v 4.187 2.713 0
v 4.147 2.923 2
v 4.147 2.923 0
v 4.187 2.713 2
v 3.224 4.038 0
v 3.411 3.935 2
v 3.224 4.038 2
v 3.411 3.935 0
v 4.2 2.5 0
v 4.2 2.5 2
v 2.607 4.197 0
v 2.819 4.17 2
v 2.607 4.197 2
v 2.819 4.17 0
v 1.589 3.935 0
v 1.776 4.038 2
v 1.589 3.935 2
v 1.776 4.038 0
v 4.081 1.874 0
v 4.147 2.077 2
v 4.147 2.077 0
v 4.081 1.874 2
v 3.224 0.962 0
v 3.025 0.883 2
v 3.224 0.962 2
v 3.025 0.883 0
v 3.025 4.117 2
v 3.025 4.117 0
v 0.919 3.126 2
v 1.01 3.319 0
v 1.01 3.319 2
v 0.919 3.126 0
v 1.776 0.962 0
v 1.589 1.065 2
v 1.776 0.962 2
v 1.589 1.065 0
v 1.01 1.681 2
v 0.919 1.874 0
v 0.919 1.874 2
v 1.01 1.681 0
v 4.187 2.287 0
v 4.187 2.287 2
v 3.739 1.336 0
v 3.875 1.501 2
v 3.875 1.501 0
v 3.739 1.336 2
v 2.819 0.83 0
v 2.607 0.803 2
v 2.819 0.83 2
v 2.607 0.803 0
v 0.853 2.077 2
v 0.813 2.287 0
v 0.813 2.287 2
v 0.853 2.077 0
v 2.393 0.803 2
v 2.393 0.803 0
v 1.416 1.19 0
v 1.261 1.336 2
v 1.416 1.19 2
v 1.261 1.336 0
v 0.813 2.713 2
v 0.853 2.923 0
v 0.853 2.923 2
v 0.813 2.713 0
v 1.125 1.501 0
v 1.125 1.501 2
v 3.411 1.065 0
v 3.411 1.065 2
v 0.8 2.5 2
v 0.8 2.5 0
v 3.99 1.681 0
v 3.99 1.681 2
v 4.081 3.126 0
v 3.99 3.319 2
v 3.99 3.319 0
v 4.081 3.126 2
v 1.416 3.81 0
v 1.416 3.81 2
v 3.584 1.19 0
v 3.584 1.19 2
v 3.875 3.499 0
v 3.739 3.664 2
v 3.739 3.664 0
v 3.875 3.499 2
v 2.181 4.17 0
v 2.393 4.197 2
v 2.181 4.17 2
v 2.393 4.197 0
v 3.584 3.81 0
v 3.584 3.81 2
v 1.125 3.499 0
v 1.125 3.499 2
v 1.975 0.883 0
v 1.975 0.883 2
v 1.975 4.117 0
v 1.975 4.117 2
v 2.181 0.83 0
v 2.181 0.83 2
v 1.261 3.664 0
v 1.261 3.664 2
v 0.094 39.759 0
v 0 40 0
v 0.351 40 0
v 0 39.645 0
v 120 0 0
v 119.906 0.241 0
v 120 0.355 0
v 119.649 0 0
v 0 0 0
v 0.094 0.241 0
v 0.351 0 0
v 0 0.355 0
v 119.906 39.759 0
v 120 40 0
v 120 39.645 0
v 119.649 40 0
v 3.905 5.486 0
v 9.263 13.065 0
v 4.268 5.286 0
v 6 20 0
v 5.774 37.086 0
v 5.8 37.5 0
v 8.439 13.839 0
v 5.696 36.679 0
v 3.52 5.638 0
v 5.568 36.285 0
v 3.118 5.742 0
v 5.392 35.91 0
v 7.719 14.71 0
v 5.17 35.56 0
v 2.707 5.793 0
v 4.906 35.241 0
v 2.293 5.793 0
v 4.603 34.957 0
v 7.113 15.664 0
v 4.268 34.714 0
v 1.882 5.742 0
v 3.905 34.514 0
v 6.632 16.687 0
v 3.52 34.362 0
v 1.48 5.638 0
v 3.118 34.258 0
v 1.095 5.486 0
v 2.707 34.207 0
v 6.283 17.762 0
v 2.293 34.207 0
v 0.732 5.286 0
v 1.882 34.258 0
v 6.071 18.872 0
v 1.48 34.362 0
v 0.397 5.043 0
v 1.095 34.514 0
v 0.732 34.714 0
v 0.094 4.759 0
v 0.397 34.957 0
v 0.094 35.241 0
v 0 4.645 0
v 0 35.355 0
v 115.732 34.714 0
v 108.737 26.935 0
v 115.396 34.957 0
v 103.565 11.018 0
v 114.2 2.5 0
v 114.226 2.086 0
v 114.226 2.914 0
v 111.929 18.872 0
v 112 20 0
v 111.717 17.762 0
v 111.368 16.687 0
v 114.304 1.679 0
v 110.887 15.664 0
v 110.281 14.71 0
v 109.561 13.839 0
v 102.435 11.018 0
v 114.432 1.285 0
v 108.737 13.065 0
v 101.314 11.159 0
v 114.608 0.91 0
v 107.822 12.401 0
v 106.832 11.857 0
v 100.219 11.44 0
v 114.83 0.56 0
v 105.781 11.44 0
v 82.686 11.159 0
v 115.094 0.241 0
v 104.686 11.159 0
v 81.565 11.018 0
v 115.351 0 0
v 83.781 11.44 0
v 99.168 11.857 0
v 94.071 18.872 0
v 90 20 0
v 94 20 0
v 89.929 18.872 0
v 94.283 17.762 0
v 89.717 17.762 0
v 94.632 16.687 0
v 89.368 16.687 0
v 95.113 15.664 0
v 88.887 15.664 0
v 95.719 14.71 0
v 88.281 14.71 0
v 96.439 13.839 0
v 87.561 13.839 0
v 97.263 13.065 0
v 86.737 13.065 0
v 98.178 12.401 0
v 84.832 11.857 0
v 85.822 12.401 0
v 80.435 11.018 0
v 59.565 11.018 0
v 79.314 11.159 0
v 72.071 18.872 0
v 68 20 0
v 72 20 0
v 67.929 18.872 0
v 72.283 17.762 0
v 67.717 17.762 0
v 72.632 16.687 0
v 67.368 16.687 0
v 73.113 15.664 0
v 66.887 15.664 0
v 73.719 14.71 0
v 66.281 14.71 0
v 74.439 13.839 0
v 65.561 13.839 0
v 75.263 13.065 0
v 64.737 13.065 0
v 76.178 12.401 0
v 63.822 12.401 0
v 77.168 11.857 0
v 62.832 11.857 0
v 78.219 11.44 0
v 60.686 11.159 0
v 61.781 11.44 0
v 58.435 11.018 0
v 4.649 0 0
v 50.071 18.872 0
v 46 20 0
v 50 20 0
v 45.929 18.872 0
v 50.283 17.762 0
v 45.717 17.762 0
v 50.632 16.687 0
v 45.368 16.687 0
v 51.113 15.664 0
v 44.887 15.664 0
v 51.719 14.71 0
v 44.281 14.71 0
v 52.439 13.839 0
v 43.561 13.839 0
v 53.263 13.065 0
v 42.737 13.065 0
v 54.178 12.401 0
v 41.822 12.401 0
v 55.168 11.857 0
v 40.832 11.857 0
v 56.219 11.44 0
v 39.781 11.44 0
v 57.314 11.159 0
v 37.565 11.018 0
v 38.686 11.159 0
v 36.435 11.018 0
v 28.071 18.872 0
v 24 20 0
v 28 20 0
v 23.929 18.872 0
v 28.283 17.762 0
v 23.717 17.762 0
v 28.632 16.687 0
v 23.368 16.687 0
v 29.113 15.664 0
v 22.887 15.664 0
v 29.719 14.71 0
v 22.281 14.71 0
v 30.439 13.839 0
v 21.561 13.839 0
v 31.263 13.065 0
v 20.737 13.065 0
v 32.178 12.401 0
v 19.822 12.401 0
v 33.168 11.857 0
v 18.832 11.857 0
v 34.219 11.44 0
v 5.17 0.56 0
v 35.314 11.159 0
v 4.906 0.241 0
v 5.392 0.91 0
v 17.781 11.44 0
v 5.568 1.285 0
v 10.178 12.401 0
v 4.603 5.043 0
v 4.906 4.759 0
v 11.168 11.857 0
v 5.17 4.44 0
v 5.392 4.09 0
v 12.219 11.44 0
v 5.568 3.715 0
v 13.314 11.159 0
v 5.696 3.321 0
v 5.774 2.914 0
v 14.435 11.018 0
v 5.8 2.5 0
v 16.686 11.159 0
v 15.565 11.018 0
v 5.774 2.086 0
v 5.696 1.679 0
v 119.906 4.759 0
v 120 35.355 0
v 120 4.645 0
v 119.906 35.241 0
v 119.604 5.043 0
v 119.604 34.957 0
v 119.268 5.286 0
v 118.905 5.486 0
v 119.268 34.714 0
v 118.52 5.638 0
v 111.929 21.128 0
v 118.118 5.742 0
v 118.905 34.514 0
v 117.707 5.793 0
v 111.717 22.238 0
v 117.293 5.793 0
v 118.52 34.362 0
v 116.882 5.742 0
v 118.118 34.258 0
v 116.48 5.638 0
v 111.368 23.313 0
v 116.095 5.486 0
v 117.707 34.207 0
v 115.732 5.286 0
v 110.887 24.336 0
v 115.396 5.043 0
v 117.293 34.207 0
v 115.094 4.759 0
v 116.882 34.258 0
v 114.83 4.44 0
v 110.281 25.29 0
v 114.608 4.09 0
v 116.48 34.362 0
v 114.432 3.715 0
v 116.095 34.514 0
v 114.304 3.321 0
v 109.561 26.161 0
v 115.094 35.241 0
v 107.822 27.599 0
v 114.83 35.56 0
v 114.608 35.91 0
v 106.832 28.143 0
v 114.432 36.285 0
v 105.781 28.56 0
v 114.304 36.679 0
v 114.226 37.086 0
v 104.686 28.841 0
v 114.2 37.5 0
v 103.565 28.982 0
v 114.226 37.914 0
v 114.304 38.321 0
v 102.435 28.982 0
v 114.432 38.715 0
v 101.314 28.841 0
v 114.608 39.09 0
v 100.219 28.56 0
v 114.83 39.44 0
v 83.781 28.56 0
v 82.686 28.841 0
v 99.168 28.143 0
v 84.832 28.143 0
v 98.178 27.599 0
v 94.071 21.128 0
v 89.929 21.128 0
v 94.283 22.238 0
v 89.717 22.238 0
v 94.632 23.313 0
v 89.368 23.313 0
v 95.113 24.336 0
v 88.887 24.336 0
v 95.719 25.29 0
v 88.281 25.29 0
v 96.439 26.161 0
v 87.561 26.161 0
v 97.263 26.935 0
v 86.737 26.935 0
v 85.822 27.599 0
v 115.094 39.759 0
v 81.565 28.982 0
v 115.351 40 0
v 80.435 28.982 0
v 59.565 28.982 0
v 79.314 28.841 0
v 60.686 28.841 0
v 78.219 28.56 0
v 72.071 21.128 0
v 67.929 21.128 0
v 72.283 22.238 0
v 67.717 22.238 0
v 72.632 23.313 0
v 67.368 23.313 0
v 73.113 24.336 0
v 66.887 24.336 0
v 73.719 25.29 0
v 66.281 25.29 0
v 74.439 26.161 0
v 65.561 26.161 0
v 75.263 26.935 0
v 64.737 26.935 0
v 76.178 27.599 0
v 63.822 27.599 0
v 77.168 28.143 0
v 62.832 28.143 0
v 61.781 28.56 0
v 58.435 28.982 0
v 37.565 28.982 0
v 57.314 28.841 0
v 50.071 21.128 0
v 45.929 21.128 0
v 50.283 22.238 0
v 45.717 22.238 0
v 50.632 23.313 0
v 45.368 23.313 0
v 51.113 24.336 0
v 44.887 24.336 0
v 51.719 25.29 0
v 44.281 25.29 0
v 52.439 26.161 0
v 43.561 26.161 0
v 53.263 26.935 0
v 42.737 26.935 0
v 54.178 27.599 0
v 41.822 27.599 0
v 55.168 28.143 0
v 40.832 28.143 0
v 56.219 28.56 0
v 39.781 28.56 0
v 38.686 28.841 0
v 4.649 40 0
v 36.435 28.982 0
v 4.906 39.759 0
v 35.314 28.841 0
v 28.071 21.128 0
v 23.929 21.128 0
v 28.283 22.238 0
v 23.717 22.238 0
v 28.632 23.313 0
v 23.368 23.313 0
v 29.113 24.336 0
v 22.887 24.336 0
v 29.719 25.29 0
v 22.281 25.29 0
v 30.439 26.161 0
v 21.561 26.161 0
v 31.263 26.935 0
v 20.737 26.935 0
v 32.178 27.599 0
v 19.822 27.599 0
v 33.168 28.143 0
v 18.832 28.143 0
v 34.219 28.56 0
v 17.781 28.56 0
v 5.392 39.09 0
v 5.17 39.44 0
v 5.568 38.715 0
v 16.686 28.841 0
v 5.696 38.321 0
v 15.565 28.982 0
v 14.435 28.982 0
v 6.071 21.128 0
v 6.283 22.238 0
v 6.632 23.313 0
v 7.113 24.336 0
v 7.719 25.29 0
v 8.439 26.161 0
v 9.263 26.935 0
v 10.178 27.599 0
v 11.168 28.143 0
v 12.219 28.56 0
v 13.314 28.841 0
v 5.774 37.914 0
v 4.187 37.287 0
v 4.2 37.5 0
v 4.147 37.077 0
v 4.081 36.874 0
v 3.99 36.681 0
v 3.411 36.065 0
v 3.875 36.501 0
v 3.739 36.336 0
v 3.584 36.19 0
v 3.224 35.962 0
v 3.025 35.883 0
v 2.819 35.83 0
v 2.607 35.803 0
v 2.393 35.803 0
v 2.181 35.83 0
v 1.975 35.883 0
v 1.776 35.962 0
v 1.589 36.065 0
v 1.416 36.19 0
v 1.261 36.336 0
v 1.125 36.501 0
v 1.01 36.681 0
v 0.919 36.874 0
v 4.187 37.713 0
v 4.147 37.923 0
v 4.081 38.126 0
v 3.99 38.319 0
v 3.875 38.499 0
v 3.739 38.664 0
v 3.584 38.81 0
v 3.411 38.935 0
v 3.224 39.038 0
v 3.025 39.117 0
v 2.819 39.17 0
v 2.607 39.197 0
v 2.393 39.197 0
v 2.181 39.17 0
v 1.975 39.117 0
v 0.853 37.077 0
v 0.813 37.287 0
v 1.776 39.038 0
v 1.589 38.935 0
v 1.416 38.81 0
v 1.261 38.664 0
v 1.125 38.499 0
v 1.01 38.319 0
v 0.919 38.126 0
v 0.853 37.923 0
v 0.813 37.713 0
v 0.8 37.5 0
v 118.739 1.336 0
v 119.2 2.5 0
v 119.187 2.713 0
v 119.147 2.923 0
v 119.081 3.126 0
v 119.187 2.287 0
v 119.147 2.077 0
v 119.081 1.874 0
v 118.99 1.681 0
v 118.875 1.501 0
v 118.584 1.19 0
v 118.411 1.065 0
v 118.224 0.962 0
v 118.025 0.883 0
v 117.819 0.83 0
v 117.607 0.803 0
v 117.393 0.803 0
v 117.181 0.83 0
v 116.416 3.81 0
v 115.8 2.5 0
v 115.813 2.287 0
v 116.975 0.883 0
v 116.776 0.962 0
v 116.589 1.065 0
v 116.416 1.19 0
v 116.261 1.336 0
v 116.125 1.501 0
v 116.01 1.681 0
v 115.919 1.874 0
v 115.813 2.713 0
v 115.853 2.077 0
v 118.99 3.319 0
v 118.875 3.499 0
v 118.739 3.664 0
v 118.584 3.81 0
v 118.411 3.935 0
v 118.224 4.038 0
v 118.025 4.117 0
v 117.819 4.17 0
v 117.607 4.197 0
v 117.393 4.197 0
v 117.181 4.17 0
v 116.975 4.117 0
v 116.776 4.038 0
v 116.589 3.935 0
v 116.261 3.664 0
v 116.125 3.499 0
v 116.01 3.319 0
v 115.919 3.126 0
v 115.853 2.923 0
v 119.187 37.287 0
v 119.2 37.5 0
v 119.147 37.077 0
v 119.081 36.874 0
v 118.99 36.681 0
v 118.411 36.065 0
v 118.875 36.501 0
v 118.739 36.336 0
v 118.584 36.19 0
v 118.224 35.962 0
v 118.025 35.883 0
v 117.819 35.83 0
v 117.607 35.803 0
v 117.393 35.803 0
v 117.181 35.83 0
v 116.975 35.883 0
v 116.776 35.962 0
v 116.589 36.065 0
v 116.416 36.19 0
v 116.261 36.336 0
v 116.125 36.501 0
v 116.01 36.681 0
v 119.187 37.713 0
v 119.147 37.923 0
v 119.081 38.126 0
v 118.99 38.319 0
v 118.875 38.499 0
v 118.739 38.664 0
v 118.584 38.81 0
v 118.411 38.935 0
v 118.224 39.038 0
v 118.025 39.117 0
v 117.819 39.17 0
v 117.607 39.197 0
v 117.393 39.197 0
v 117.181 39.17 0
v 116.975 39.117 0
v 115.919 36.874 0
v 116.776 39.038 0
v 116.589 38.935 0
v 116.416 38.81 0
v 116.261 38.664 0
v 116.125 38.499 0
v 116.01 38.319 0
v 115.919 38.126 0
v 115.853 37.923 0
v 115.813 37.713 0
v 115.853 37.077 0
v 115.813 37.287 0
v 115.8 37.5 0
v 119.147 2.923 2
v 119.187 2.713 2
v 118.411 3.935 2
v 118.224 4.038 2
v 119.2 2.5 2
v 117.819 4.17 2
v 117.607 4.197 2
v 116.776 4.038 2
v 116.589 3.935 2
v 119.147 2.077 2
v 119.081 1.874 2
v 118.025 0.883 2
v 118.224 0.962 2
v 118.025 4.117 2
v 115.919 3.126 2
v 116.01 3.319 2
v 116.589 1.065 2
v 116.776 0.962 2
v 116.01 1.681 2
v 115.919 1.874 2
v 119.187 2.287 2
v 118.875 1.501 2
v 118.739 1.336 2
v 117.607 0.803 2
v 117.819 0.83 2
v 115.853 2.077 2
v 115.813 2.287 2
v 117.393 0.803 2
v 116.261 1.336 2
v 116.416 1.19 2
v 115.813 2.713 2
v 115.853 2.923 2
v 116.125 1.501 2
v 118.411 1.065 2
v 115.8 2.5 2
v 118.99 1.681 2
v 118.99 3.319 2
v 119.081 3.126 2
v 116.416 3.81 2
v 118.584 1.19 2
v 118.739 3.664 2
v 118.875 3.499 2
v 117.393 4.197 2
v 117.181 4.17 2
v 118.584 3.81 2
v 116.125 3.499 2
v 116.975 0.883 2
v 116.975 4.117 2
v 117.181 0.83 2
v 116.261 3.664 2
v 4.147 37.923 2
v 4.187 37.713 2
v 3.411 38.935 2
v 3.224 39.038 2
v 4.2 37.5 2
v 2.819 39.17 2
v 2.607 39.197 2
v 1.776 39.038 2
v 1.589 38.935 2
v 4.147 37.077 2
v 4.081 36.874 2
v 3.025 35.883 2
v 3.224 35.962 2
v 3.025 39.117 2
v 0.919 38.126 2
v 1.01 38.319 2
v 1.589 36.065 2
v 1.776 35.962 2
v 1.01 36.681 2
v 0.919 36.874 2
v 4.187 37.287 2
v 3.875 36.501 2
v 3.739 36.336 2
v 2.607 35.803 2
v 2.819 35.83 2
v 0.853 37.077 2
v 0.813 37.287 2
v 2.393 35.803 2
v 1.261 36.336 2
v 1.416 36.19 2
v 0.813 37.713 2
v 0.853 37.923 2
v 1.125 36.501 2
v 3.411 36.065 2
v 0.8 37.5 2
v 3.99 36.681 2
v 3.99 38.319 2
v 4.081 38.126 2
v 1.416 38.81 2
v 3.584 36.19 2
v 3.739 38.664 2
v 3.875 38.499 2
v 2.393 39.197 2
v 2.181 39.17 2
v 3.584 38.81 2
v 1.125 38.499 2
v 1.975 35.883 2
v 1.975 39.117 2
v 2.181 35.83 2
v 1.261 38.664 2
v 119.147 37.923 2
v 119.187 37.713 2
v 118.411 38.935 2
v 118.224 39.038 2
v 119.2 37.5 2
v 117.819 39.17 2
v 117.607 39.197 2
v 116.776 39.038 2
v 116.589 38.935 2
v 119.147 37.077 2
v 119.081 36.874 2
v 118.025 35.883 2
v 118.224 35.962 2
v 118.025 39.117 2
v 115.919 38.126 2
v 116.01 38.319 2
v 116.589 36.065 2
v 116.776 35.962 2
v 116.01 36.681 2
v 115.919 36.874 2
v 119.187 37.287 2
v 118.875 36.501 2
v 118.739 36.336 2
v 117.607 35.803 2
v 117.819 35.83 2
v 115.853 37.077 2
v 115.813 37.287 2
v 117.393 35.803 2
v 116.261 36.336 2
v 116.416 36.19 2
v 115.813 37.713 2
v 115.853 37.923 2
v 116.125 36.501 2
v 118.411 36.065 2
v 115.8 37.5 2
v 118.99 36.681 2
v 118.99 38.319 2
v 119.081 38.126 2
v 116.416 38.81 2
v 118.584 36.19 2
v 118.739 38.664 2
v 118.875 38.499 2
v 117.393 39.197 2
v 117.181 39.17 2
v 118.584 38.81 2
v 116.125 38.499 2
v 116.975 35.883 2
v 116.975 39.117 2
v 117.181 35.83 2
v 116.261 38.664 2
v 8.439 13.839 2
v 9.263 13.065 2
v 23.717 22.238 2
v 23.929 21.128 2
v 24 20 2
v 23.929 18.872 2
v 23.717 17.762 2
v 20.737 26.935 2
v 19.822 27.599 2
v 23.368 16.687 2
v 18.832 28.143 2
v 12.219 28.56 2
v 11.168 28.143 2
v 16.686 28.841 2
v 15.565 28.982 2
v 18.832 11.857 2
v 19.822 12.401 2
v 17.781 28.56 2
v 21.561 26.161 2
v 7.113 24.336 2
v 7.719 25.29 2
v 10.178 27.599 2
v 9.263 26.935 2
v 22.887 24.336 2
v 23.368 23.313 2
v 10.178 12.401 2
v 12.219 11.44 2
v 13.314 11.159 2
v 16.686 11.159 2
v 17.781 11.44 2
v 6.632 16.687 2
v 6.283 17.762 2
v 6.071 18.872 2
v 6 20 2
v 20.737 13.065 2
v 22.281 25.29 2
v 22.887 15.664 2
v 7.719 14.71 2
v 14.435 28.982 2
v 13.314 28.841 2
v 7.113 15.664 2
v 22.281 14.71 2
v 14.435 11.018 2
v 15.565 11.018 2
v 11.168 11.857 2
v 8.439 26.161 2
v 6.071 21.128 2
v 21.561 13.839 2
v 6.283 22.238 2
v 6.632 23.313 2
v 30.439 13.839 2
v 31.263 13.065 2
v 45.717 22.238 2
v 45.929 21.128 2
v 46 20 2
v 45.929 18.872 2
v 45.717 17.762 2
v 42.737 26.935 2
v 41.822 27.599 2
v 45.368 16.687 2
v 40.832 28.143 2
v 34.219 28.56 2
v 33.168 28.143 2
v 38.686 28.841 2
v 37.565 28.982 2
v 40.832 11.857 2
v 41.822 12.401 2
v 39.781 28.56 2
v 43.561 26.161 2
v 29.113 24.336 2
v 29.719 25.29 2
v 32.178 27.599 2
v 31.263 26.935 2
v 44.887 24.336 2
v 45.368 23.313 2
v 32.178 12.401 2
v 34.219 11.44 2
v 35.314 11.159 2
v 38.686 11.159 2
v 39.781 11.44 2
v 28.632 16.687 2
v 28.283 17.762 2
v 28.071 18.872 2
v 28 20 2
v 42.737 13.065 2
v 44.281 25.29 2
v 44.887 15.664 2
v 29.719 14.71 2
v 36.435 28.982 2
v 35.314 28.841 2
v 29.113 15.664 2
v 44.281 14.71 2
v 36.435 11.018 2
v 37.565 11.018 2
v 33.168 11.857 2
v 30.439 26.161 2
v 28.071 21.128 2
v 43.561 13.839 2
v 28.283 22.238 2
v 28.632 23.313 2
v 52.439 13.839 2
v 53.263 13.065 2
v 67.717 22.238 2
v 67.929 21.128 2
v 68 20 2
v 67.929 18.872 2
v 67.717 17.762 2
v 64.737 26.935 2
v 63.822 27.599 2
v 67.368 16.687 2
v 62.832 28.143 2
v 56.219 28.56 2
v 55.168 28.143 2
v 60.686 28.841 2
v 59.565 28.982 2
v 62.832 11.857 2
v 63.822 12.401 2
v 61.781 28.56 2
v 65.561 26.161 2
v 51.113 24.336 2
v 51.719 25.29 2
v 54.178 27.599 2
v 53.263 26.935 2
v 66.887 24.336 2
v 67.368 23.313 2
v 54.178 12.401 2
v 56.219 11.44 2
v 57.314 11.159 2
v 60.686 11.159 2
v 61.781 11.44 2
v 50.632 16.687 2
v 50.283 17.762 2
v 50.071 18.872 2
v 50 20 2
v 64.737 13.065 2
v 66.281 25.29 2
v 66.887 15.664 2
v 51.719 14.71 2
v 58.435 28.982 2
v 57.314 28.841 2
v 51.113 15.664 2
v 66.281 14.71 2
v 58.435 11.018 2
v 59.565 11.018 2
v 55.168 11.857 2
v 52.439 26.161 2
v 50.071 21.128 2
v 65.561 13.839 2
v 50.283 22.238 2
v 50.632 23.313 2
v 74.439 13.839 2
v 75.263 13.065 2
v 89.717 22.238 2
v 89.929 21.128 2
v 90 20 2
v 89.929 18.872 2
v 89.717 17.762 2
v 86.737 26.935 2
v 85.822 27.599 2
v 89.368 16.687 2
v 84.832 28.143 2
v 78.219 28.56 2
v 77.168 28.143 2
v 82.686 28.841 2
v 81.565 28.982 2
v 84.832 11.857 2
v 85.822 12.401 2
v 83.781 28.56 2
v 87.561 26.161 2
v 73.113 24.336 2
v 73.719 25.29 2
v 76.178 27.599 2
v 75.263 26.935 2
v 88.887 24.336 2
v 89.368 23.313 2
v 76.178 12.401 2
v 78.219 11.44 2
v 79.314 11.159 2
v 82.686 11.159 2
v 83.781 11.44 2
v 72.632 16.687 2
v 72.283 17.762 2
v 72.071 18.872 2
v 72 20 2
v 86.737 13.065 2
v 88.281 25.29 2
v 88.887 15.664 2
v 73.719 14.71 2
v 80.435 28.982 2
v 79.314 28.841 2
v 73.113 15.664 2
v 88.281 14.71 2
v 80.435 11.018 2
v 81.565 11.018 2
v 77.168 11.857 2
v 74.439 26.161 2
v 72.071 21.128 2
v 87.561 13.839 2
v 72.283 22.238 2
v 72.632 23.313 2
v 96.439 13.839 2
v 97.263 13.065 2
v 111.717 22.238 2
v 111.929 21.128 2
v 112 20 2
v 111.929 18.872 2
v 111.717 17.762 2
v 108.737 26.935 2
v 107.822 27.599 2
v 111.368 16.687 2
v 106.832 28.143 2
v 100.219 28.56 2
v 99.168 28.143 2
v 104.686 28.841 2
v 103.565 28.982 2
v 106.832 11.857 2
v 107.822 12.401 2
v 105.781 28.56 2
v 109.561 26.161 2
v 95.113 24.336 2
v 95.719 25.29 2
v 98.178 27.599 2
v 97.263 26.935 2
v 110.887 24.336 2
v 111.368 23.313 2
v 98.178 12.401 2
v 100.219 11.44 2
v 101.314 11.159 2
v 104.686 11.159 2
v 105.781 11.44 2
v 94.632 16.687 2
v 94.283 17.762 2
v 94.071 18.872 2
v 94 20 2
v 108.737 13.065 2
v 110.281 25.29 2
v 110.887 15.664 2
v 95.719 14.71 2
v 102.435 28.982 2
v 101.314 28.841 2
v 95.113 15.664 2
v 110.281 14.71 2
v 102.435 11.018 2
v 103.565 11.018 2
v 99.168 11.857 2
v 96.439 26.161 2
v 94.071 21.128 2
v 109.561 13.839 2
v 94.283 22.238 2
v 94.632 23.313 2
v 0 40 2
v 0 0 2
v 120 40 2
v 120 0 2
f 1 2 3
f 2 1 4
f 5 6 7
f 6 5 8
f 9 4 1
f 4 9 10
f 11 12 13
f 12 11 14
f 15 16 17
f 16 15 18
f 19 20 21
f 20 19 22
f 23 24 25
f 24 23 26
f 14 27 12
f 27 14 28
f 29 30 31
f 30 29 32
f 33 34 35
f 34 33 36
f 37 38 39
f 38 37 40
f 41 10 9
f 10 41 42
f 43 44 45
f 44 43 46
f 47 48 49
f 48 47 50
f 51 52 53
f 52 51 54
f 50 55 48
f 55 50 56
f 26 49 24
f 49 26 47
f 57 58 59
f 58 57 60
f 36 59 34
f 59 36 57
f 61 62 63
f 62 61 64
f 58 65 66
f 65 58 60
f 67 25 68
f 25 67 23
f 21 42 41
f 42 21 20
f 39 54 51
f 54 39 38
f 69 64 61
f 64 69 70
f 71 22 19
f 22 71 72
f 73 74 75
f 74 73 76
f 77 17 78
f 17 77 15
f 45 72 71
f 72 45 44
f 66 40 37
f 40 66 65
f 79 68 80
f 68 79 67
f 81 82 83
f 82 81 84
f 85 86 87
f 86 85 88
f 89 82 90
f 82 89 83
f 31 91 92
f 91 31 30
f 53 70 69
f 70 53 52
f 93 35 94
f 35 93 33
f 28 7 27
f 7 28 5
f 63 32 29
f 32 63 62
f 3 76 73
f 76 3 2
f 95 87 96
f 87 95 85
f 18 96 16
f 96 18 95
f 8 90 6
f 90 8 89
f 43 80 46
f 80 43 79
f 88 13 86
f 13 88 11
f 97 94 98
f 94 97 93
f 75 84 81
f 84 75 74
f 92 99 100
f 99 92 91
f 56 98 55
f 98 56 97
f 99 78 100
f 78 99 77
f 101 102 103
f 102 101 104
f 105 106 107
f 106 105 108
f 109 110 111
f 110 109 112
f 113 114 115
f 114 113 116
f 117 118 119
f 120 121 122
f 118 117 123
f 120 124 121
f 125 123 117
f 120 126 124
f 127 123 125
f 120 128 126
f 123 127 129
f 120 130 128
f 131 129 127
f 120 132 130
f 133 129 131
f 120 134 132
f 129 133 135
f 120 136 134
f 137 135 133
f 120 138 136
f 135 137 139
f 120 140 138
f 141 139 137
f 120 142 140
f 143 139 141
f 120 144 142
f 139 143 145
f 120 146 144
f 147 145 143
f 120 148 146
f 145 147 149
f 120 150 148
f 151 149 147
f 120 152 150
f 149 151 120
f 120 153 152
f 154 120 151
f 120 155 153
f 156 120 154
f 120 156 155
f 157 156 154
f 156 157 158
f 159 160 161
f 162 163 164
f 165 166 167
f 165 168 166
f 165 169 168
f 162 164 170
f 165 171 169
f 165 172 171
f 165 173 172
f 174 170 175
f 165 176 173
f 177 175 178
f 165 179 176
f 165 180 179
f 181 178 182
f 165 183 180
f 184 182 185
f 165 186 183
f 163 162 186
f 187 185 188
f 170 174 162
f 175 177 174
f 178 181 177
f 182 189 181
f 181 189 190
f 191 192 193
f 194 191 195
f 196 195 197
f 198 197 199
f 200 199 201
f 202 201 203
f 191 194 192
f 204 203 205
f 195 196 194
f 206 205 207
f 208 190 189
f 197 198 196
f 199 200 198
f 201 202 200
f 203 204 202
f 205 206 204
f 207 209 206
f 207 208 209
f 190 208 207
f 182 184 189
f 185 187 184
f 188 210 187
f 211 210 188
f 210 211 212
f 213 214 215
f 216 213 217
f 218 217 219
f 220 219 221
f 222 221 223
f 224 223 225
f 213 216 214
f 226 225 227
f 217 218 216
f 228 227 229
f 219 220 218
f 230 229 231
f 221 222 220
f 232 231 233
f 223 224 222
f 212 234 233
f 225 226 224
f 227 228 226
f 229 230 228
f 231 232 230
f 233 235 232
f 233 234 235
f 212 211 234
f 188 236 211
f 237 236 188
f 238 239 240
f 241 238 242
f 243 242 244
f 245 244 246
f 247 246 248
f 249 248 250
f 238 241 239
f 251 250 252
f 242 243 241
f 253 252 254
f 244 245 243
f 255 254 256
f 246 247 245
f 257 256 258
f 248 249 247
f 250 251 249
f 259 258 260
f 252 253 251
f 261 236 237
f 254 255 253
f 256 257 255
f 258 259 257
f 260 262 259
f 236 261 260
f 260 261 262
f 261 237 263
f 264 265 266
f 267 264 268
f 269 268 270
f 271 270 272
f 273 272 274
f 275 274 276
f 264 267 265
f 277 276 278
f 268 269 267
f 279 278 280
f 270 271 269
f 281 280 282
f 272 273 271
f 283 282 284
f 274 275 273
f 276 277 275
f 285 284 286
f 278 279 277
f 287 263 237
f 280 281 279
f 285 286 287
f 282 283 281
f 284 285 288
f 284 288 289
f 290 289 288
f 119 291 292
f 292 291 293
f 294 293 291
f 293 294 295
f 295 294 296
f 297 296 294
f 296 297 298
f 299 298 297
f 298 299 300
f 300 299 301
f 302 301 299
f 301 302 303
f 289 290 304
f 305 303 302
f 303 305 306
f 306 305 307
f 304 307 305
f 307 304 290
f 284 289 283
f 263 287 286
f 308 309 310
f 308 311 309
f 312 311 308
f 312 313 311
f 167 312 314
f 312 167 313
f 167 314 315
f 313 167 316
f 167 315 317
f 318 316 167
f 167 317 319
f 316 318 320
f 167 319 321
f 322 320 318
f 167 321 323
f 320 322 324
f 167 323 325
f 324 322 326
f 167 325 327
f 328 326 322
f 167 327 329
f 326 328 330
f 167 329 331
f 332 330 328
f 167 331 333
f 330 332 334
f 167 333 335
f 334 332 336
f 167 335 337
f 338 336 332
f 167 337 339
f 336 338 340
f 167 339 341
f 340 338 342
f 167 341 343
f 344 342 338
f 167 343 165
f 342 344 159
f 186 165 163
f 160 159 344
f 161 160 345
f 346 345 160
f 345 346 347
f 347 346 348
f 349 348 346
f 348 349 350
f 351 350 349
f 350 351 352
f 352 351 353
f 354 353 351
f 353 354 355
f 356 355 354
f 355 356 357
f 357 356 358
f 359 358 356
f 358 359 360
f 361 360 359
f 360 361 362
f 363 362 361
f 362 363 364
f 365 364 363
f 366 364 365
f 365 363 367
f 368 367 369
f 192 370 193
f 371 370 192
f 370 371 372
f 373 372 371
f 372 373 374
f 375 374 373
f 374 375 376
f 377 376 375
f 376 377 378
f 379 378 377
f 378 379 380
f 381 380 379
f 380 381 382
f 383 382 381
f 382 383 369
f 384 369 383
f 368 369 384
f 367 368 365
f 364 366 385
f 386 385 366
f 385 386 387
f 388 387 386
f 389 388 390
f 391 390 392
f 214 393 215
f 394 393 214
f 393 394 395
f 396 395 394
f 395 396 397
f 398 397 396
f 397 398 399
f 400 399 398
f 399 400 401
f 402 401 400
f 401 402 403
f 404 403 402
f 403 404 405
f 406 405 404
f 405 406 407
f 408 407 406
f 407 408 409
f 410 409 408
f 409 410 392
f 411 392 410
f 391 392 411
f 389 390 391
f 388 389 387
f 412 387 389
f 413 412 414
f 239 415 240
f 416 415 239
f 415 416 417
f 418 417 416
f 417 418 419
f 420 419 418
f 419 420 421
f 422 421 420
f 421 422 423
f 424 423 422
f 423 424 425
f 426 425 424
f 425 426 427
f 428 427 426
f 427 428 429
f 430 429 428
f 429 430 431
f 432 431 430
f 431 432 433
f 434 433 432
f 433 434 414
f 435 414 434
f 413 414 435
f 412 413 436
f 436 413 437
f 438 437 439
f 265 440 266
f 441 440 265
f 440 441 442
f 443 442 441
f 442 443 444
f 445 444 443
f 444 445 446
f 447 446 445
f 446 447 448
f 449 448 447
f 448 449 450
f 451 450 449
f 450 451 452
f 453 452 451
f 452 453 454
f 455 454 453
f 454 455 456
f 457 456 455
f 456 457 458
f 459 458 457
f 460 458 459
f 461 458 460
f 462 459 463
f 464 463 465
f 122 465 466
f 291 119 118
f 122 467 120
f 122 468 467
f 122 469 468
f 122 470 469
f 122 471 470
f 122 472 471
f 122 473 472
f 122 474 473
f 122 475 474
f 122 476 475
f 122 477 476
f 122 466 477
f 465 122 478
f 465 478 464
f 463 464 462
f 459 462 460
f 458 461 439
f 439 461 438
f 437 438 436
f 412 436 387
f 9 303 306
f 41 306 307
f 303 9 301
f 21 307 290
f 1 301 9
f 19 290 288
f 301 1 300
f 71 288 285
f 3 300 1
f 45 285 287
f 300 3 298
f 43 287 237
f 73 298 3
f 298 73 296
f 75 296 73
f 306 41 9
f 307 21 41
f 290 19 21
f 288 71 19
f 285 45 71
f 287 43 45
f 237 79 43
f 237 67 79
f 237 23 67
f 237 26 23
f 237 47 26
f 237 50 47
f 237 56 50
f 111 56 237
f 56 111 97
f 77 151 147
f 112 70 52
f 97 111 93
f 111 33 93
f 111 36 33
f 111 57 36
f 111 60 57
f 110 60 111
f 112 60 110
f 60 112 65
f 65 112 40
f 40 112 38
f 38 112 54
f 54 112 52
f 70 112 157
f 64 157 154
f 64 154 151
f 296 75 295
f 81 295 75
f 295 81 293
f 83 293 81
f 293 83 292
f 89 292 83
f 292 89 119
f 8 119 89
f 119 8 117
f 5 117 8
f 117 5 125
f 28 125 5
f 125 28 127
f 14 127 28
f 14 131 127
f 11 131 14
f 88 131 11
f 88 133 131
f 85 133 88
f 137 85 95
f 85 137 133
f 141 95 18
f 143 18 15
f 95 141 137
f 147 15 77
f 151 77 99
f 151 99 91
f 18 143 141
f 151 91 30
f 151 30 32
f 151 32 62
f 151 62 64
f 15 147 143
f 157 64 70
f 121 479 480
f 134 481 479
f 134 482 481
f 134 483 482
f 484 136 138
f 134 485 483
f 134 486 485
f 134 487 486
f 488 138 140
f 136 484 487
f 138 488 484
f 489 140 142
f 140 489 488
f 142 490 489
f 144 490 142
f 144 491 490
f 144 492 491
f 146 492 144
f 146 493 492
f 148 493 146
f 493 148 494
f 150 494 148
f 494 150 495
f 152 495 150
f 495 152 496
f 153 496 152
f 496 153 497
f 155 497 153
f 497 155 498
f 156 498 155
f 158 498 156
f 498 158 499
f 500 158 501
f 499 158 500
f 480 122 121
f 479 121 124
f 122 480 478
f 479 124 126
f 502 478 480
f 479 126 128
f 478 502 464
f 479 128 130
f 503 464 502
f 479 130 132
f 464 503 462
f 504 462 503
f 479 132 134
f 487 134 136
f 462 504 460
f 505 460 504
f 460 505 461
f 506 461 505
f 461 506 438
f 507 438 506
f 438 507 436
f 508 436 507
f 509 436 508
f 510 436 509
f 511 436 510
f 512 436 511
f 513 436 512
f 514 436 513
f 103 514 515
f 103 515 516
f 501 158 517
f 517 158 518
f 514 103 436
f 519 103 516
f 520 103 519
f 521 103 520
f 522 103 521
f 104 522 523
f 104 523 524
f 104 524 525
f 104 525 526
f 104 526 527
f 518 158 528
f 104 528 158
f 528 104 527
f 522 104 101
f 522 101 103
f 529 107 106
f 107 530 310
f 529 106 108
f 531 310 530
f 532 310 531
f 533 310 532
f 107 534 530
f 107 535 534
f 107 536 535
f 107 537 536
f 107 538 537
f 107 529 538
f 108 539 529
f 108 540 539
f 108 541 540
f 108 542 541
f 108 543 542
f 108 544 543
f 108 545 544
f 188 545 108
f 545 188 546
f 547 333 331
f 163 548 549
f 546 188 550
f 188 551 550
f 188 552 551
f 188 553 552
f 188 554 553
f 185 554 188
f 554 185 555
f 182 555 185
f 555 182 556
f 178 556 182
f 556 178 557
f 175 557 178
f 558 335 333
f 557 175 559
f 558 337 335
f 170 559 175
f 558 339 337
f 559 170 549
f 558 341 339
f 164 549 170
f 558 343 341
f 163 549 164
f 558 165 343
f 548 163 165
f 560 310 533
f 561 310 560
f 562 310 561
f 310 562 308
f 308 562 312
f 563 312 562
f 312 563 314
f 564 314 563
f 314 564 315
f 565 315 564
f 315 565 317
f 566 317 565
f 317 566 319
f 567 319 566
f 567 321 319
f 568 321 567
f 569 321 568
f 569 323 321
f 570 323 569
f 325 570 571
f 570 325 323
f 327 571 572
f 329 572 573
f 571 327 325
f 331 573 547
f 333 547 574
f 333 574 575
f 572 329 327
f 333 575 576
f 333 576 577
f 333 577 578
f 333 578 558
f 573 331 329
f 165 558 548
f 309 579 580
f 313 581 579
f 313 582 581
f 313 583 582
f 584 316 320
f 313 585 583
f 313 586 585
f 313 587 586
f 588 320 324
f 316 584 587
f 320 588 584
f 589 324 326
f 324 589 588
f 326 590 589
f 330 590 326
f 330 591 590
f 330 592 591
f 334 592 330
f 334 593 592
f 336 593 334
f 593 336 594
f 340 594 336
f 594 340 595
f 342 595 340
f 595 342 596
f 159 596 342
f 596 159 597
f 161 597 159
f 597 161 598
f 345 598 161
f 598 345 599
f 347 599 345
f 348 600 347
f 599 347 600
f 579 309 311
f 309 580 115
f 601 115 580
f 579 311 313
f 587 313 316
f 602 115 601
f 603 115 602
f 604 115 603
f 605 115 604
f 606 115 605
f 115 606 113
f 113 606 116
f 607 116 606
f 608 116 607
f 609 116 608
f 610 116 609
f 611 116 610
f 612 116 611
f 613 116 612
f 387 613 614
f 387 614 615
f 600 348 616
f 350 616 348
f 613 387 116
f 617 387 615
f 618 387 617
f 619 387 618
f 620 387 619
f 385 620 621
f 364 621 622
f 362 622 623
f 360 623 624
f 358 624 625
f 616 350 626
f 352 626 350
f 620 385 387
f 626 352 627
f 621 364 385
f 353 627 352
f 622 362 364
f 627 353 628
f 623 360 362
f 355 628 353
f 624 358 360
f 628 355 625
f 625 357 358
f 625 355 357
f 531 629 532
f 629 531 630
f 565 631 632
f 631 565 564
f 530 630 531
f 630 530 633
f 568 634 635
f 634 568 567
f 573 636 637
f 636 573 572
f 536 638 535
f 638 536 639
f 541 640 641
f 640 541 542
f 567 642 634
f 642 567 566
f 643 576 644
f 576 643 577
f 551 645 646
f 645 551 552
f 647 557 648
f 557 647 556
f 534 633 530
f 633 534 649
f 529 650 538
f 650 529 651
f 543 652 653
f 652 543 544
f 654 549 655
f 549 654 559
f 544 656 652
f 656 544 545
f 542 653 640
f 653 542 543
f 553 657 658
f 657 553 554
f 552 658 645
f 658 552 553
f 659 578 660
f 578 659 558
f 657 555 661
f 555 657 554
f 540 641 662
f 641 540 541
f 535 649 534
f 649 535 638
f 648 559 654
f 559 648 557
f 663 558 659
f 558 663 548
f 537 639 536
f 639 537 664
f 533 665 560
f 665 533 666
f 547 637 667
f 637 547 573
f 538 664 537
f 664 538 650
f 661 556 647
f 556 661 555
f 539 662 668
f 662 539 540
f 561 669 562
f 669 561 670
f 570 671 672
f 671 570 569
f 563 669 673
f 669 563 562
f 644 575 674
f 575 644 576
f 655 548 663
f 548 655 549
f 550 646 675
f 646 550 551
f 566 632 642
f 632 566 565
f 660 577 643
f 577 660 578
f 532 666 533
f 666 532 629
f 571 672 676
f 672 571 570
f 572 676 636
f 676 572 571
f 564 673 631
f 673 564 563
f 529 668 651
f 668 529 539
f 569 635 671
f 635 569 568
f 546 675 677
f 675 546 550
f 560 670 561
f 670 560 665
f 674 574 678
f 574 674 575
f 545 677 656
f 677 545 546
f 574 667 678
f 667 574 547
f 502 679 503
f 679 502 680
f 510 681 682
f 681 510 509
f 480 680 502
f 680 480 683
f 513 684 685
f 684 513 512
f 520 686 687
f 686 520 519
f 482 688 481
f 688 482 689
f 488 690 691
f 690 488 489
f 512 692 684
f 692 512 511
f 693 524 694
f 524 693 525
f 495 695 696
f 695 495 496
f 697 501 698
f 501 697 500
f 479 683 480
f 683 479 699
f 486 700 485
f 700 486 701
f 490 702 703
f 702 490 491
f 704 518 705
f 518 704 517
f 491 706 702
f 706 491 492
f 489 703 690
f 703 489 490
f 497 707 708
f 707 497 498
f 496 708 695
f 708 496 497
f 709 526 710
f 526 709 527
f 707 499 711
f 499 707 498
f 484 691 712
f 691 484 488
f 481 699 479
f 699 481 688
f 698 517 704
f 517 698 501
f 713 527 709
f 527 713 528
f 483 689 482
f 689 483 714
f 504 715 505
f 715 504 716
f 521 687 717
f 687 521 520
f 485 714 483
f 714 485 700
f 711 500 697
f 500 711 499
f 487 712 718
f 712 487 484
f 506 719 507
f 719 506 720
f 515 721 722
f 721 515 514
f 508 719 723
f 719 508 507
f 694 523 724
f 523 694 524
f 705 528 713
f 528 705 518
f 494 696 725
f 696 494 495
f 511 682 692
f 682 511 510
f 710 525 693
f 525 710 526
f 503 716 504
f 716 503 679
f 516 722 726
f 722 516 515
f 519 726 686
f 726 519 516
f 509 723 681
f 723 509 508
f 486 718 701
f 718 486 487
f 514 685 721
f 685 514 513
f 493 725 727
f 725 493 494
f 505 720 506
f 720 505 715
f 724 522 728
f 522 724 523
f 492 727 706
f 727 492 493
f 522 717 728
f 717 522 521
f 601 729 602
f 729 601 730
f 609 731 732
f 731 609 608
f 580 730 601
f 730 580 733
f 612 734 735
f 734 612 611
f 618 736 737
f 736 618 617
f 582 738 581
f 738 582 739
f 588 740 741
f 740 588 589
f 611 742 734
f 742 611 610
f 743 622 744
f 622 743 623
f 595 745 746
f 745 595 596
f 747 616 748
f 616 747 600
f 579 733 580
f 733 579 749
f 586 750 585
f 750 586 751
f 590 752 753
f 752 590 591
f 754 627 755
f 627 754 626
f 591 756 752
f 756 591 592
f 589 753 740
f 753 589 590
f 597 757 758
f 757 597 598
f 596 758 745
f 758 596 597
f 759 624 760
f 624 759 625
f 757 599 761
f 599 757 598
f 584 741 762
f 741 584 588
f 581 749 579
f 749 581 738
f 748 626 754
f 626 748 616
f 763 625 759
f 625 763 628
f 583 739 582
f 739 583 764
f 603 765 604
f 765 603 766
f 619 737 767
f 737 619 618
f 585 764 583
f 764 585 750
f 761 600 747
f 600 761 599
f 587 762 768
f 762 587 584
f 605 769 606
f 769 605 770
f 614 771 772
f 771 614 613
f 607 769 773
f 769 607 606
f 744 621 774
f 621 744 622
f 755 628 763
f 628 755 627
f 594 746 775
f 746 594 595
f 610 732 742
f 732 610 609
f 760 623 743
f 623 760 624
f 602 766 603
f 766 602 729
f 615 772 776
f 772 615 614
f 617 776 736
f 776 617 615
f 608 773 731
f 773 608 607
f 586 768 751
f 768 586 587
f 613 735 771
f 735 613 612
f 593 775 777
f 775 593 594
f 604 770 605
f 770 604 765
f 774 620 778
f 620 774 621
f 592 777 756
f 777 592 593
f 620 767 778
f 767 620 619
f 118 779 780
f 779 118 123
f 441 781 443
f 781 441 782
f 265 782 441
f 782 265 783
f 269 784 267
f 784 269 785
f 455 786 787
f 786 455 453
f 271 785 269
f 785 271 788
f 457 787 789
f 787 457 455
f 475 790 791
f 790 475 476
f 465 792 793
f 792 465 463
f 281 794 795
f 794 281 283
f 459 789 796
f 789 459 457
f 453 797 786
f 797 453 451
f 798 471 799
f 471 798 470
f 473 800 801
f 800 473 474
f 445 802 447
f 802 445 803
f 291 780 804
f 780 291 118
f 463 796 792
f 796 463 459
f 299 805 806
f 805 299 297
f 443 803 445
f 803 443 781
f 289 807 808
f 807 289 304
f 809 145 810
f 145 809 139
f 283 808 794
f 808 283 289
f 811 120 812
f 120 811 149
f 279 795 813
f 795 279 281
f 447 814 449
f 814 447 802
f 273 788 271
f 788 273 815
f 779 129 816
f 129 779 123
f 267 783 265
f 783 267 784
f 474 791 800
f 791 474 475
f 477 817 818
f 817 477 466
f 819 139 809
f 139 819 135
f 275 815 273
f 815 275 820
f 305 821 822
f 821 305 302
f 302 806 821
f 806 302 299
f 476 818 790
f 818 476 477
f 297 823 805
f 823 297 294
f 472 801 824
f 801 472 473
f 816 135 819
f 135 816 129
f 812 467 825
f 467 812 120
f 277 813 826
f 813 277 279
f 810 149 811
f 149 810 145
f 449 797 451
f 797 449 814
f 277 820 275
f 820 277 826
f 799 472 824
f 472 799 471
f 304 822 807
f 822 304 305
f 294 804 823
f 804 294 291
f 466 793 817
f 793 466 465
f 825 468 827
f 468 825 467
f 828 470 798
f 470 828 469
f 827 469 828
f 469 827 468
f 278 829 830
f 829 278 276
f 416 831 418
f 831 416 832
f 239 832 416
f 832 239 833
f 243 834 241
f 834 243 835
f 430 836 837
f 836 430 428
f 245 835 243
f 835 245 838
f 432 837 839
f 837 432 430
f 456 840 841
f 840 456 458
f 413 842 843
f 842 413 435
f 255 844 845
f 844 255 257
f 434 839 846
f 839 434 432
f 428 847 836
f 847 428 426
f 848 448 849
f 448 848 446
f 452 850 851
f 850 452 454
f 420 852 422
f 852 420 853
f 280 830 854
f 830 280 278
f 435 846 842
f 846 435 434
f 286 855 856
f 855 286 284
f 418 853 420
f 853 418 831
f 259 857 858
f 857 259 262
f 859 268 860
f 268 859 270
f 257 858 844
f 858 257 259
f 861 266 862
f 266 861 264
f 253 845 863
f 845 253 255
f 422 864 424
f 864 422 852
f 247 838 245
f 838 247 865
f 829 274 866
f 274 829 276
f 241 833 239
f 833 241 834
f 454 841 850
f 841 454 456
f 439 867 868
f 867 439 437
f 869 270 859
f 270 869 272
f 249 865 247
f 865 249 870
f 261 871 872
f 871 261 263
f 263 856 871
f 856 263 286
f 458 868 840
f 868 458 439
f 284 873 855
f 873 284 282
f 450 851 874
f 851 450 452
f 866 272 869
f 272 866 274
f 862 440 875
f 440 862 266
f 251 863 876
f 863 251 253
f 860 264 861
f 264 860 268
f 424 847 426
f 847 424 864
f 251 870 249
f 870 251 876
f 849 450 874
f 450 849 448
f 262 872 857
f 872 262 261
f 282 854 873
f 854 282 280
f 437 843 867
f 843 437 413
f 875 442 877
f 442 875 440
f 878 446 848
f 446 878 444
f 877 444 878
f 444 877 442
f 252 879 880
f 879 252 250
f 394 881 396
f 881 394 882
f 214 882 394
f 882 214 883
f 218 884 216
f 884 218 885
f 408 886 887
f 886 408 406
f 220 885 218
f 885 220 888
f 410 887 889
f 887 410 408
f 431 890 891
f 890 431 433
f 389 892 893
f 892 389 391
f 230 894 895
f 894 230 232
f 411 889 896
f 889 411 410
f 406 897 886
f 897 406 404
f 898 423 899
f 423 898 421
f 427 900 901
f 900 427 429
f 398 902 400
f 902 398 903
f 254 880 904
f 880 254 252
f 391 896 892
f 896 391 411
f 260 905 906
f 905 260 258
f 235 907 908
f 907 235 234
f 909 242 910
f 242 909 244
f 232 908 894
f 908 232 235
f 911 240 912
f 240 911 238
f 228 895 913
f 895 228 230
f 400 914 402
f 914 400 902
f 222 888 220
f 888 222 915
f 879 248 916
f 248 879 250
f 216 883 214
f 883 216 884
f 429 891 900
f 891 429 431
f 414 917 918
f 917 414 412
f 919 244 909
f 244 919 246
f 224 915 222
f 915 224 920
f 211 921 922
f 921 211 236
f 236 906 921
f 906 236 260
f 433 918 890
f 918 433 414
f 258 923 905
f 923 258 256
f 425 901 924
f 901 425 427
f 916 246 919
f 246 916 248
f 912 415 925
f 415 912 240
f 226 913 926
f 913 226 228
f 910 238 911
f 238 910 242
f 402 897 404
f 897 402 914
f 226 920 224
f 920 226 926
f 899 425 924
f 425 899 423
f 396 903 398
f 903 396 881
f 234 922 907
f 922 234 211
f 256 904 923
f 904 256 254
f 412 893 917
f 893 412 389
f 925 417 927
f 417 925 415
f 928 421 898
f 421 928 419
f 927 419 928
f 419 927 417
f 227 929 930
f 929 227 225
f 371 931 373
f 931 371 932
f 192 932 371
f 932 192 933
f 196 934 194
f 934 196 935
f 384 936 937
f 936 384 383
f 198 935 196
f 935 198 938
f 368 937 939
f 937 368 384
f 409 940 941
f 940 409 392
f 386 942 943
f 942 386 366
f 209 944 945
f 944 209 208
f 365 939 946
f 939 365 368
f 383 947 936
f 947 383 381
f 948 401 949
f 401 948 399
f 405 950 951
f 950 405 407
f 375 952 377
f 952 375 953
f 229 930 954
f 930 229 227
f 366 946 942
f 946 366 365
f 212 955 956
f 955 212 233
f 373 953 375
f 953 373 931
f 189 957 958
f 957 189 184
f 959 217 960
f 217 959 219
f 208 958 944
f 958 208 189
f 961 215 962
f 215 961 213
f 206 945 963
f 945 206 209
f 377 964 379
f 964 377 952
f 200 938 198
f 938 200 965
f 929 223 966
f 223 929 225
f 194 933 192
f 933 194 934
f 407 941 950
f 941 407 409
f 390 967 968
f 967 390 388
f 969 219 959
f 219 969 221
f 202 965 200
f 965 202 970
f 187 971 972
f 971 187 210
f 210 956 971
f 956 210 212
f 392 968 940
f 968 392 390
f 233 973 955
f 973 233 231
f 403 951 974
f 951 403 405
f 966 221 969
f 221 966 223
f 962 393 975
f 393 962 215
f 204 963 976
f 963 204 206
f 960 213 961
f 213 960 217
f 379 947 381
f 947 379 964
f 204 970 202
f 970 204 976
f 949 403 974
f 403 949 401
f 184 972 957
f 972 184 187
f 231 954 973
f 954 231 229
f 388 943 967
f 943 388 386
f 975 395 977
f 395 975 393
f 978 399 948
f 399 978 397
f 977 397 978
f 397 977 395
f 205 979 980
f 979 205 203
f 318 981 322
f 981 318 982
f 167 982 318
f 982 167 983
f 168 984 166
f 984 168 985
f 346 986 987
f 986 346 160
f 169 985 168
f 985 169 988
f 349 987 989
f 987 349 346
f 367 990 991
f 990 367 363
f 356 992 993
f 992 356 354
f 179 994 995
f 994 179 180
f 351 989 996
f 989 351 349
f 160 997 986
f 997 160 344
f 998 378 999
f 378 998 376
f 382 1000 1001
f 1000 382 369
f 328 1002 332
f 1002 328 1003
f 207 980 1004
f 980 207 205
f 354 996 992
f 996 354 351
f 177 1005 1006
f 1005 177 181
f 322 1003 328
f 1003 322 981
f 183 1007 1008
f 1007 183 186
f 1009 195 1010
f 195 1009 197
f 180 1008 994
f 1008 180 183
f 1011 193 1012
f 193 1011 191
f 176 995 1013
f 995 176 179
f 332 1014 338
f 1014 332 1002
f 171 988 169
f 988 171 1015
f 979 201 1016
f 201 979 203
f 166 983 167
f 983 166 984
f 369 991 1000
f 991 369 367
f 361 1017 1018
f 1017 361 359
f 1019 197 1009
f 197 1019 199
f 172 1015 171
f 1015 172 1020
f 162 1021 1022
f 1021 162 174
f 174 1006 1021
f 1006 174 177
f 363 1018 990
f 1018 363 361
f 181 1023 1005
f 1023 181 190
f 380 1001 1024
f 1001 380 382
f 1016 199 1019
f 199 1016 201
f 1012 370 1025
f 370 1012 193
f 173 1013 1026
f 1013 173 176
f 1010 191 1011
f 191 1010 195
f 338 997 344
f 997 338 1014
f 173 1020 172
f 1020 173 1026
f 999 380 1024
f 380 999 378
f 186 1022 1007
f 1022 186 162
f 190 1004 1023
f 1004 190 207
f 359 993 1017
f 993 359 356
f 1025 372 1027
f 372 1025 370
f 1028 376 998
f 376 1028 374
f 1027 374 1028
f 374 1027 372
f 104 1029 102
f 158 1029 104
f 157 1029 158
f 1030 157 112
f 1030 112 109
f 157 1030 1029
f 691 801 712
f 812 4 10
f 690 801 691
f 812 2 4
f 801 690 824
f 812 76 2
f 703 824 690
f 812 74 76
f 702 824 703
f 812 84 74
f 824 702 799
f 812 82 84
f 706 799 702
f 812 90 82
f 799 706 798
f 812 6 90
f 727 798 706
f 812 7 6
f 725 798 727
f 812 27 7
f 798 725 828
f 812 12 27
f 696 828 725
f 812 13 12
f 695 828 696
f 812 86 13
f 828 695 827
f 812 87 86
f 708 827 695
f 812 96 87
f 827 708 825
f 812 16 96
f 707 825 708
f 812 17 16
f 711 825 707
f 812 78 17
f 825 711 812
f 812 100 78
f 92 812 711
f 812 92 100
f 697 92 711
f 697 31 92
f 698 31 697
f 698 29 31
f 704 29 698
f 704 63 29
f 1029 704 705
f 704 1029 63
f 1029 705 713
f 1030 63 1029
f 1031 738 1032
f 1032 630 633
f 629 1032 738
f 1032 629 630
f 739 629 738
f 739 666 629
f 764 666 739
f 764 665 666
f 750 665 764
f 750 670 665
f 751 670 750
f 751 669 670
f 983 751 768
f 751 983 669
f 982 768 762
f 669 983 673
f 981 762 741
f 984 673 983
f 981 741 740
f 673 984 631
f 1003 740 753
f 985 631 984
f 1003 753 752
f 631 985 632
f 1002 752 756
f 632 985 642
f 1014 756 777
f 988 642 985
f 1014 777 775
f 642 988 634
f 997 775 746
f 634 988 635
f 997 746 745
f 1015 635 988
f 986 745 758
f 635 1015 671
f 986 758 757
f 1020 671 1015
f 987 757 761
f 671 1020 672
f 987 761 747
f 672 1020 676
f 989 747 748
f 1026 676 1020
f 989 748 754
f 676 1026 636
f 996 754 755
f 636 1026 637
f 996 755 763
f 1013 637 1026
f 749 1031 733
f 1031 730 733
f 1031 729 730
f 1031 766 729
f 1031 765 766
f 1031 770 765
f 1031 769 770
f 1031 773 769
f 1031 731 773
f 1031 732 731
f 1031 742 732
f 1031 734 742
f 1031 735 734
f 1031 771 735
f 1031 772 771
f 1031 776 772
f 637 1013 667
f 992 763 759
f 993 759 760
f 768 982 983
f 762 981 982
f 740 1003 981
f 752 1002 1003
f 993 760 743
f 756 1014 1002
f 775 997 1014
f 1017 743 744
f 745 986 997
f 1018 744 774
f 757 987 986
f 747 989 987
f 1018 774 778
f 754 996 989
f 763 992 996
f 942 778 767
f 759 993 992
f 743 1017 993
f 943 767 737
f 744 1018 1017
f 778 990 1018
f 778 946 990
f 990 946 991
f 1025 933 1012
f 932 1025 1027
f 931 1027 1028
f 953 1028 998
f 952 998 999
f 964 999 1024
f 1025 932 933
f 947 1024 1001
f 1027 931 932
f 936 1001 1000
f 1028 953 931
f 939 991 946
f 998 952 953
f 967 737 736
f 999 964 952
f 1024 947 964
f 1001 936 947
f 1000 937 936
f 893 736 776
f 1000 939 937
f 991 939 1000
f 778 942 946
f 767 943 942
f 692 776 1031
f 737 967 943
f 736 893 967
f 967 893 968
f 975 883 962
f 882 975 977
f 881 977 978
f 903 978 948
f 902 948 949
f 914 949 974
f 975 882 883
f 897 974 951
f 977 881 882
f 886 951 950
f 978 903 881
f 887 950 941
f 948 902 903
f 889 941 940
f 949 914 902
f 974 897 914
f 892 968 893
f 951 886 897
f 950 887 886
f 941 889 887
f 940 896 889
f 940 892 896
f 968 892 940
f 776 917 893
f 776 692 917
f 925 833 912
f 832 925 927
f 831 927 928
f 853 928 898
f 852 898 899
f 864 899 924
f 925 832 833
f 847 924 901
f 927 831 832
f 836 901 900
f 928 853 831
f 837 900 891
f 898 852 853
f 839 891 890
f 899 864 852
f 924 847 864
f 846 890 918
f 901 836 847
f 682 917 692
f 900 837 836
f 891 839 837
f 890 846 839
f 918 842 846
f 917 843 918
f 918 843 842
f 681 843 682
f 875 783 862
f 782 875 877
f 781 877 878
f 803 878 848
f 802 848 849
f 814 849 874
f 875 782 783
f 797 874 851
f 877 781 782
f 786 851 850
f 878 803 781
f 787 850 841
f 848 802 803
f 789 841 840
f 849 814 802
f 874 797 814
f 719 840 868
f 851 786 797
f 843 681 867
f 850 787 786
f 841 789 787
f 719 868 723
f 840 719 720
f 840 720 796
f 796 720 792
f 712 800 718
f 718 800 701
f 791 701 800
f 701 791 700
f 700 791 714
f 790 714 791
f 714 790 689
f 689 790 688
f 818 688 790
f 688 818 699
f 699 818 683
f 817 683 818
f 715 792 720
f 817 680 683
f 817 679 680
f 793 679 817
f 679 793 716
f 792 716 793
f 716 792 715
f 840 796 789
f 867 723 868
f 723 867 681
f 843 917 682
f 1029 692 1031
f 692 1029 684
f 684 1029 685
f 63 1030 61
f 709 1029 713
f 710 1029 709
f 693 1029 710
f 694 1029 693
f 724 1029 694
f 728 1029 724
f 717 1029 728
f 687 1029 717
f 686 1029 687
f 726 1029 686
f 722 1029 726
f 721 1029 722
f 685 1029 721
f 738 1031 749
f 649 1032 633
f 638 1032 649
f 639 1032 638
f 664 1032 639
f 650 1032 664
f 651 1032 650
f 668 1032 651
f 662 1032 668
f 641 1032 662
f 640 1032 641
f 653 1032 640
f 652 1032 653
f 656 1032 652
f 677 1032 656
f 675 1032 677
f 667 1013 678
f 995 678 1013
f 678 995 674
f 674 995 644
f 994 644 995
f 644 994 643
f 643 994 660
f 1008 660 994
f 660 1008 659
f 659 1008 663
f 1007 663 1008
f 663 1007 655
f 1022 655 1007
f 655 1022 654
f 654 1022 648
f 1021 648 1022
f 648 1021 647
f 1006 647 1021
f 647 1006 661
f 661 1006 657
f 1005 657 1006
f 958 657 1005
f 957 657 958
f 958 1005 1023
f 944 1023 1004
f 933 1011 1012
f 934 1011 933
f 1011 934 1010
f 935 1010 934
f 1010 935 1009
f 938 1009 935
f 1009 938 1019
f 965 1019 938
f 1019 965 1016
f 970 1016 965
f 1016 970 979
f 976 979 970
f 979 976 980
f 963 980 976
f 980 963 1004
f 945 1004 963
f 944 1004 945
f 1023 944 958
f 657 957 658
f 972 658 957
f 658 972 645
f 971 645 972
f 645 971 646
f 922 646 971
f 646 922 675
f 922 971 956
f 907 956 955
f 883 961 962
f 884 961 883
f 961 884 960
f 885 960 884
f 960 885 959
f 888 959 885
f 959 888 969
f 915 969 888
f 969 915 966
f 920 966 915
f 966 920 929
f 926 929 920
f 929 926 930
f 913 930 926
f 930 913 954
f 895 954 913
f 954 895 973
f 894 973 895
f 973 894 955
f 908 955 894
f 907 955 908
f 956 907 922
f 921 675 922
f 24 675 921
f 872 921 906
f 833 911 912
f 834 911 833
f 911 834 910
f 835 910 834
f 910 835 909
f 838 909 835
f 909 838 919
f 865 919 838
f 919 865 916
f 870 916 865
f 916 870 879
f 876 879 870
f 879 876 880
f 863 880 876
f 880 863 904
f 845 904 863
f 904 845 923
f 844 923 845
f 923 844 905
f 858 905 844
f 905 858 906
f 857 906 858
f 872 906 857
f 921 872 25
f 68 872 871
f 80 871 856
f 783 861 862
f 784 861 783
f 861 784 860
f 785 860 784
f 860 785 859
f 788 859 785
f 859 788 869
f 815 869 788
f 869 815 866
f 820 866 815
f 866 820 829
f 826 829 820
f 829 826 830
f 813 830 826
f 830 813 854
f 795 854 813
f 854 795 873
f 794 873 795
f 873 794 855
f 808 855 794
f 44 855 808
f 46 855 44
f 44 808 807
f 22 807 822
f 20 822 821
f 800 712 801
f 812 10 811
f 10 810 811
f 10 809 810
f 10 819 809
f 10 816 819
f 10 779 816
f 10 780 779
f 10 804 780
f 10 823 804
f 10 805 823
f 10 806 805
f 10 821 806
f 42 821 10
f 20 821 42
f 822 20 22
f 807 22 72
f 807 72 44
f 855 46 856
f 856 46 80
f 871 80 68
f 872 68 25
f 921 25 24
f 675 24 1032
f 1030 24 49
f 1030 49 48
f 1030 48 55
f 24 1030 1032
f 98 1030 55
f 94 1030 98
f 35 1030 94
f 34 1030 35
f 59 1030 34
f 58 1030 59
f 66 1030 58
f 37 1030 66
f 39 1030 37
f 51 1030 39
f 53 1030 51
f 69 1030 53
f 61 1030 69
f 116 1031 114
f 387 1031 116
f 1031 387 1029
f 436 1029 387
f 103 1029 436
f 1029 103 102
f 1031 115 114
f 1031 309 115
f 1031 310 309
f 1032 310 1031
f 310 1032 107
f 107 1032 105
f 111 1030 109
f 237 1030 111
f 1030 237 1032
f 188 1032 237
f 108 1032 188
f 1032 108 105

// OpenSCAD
$fn=50;
module screw_m3() {
        union() {
            linear_extrude(12) {
                circle(r=1.7);
            }
            linear_extrude(6) {
                circle(r=3.3);
            }
        }
}
module bt() {
    linear_extrude(25) {
        square([130,45]);
    }
}
difference() {
    linear_extrude(2) {
        square([120,40]);
    }
    union() {
        translate([2.5,2.5,-6]){
            screw_m3();
        }
        translate([117.5,2.5,-6]){
            screw_m3();
        }
        translate([2.5,37.5,-6]){
            screw_m3();
        }
        translate([117.5,37.5,-6]){
            screw_m3();
        }
        
        for(i= [0:4]) {
            translate([22*i+15,20,-1]){
                cylinder(r=9,4);
            }
        }
    }
}
